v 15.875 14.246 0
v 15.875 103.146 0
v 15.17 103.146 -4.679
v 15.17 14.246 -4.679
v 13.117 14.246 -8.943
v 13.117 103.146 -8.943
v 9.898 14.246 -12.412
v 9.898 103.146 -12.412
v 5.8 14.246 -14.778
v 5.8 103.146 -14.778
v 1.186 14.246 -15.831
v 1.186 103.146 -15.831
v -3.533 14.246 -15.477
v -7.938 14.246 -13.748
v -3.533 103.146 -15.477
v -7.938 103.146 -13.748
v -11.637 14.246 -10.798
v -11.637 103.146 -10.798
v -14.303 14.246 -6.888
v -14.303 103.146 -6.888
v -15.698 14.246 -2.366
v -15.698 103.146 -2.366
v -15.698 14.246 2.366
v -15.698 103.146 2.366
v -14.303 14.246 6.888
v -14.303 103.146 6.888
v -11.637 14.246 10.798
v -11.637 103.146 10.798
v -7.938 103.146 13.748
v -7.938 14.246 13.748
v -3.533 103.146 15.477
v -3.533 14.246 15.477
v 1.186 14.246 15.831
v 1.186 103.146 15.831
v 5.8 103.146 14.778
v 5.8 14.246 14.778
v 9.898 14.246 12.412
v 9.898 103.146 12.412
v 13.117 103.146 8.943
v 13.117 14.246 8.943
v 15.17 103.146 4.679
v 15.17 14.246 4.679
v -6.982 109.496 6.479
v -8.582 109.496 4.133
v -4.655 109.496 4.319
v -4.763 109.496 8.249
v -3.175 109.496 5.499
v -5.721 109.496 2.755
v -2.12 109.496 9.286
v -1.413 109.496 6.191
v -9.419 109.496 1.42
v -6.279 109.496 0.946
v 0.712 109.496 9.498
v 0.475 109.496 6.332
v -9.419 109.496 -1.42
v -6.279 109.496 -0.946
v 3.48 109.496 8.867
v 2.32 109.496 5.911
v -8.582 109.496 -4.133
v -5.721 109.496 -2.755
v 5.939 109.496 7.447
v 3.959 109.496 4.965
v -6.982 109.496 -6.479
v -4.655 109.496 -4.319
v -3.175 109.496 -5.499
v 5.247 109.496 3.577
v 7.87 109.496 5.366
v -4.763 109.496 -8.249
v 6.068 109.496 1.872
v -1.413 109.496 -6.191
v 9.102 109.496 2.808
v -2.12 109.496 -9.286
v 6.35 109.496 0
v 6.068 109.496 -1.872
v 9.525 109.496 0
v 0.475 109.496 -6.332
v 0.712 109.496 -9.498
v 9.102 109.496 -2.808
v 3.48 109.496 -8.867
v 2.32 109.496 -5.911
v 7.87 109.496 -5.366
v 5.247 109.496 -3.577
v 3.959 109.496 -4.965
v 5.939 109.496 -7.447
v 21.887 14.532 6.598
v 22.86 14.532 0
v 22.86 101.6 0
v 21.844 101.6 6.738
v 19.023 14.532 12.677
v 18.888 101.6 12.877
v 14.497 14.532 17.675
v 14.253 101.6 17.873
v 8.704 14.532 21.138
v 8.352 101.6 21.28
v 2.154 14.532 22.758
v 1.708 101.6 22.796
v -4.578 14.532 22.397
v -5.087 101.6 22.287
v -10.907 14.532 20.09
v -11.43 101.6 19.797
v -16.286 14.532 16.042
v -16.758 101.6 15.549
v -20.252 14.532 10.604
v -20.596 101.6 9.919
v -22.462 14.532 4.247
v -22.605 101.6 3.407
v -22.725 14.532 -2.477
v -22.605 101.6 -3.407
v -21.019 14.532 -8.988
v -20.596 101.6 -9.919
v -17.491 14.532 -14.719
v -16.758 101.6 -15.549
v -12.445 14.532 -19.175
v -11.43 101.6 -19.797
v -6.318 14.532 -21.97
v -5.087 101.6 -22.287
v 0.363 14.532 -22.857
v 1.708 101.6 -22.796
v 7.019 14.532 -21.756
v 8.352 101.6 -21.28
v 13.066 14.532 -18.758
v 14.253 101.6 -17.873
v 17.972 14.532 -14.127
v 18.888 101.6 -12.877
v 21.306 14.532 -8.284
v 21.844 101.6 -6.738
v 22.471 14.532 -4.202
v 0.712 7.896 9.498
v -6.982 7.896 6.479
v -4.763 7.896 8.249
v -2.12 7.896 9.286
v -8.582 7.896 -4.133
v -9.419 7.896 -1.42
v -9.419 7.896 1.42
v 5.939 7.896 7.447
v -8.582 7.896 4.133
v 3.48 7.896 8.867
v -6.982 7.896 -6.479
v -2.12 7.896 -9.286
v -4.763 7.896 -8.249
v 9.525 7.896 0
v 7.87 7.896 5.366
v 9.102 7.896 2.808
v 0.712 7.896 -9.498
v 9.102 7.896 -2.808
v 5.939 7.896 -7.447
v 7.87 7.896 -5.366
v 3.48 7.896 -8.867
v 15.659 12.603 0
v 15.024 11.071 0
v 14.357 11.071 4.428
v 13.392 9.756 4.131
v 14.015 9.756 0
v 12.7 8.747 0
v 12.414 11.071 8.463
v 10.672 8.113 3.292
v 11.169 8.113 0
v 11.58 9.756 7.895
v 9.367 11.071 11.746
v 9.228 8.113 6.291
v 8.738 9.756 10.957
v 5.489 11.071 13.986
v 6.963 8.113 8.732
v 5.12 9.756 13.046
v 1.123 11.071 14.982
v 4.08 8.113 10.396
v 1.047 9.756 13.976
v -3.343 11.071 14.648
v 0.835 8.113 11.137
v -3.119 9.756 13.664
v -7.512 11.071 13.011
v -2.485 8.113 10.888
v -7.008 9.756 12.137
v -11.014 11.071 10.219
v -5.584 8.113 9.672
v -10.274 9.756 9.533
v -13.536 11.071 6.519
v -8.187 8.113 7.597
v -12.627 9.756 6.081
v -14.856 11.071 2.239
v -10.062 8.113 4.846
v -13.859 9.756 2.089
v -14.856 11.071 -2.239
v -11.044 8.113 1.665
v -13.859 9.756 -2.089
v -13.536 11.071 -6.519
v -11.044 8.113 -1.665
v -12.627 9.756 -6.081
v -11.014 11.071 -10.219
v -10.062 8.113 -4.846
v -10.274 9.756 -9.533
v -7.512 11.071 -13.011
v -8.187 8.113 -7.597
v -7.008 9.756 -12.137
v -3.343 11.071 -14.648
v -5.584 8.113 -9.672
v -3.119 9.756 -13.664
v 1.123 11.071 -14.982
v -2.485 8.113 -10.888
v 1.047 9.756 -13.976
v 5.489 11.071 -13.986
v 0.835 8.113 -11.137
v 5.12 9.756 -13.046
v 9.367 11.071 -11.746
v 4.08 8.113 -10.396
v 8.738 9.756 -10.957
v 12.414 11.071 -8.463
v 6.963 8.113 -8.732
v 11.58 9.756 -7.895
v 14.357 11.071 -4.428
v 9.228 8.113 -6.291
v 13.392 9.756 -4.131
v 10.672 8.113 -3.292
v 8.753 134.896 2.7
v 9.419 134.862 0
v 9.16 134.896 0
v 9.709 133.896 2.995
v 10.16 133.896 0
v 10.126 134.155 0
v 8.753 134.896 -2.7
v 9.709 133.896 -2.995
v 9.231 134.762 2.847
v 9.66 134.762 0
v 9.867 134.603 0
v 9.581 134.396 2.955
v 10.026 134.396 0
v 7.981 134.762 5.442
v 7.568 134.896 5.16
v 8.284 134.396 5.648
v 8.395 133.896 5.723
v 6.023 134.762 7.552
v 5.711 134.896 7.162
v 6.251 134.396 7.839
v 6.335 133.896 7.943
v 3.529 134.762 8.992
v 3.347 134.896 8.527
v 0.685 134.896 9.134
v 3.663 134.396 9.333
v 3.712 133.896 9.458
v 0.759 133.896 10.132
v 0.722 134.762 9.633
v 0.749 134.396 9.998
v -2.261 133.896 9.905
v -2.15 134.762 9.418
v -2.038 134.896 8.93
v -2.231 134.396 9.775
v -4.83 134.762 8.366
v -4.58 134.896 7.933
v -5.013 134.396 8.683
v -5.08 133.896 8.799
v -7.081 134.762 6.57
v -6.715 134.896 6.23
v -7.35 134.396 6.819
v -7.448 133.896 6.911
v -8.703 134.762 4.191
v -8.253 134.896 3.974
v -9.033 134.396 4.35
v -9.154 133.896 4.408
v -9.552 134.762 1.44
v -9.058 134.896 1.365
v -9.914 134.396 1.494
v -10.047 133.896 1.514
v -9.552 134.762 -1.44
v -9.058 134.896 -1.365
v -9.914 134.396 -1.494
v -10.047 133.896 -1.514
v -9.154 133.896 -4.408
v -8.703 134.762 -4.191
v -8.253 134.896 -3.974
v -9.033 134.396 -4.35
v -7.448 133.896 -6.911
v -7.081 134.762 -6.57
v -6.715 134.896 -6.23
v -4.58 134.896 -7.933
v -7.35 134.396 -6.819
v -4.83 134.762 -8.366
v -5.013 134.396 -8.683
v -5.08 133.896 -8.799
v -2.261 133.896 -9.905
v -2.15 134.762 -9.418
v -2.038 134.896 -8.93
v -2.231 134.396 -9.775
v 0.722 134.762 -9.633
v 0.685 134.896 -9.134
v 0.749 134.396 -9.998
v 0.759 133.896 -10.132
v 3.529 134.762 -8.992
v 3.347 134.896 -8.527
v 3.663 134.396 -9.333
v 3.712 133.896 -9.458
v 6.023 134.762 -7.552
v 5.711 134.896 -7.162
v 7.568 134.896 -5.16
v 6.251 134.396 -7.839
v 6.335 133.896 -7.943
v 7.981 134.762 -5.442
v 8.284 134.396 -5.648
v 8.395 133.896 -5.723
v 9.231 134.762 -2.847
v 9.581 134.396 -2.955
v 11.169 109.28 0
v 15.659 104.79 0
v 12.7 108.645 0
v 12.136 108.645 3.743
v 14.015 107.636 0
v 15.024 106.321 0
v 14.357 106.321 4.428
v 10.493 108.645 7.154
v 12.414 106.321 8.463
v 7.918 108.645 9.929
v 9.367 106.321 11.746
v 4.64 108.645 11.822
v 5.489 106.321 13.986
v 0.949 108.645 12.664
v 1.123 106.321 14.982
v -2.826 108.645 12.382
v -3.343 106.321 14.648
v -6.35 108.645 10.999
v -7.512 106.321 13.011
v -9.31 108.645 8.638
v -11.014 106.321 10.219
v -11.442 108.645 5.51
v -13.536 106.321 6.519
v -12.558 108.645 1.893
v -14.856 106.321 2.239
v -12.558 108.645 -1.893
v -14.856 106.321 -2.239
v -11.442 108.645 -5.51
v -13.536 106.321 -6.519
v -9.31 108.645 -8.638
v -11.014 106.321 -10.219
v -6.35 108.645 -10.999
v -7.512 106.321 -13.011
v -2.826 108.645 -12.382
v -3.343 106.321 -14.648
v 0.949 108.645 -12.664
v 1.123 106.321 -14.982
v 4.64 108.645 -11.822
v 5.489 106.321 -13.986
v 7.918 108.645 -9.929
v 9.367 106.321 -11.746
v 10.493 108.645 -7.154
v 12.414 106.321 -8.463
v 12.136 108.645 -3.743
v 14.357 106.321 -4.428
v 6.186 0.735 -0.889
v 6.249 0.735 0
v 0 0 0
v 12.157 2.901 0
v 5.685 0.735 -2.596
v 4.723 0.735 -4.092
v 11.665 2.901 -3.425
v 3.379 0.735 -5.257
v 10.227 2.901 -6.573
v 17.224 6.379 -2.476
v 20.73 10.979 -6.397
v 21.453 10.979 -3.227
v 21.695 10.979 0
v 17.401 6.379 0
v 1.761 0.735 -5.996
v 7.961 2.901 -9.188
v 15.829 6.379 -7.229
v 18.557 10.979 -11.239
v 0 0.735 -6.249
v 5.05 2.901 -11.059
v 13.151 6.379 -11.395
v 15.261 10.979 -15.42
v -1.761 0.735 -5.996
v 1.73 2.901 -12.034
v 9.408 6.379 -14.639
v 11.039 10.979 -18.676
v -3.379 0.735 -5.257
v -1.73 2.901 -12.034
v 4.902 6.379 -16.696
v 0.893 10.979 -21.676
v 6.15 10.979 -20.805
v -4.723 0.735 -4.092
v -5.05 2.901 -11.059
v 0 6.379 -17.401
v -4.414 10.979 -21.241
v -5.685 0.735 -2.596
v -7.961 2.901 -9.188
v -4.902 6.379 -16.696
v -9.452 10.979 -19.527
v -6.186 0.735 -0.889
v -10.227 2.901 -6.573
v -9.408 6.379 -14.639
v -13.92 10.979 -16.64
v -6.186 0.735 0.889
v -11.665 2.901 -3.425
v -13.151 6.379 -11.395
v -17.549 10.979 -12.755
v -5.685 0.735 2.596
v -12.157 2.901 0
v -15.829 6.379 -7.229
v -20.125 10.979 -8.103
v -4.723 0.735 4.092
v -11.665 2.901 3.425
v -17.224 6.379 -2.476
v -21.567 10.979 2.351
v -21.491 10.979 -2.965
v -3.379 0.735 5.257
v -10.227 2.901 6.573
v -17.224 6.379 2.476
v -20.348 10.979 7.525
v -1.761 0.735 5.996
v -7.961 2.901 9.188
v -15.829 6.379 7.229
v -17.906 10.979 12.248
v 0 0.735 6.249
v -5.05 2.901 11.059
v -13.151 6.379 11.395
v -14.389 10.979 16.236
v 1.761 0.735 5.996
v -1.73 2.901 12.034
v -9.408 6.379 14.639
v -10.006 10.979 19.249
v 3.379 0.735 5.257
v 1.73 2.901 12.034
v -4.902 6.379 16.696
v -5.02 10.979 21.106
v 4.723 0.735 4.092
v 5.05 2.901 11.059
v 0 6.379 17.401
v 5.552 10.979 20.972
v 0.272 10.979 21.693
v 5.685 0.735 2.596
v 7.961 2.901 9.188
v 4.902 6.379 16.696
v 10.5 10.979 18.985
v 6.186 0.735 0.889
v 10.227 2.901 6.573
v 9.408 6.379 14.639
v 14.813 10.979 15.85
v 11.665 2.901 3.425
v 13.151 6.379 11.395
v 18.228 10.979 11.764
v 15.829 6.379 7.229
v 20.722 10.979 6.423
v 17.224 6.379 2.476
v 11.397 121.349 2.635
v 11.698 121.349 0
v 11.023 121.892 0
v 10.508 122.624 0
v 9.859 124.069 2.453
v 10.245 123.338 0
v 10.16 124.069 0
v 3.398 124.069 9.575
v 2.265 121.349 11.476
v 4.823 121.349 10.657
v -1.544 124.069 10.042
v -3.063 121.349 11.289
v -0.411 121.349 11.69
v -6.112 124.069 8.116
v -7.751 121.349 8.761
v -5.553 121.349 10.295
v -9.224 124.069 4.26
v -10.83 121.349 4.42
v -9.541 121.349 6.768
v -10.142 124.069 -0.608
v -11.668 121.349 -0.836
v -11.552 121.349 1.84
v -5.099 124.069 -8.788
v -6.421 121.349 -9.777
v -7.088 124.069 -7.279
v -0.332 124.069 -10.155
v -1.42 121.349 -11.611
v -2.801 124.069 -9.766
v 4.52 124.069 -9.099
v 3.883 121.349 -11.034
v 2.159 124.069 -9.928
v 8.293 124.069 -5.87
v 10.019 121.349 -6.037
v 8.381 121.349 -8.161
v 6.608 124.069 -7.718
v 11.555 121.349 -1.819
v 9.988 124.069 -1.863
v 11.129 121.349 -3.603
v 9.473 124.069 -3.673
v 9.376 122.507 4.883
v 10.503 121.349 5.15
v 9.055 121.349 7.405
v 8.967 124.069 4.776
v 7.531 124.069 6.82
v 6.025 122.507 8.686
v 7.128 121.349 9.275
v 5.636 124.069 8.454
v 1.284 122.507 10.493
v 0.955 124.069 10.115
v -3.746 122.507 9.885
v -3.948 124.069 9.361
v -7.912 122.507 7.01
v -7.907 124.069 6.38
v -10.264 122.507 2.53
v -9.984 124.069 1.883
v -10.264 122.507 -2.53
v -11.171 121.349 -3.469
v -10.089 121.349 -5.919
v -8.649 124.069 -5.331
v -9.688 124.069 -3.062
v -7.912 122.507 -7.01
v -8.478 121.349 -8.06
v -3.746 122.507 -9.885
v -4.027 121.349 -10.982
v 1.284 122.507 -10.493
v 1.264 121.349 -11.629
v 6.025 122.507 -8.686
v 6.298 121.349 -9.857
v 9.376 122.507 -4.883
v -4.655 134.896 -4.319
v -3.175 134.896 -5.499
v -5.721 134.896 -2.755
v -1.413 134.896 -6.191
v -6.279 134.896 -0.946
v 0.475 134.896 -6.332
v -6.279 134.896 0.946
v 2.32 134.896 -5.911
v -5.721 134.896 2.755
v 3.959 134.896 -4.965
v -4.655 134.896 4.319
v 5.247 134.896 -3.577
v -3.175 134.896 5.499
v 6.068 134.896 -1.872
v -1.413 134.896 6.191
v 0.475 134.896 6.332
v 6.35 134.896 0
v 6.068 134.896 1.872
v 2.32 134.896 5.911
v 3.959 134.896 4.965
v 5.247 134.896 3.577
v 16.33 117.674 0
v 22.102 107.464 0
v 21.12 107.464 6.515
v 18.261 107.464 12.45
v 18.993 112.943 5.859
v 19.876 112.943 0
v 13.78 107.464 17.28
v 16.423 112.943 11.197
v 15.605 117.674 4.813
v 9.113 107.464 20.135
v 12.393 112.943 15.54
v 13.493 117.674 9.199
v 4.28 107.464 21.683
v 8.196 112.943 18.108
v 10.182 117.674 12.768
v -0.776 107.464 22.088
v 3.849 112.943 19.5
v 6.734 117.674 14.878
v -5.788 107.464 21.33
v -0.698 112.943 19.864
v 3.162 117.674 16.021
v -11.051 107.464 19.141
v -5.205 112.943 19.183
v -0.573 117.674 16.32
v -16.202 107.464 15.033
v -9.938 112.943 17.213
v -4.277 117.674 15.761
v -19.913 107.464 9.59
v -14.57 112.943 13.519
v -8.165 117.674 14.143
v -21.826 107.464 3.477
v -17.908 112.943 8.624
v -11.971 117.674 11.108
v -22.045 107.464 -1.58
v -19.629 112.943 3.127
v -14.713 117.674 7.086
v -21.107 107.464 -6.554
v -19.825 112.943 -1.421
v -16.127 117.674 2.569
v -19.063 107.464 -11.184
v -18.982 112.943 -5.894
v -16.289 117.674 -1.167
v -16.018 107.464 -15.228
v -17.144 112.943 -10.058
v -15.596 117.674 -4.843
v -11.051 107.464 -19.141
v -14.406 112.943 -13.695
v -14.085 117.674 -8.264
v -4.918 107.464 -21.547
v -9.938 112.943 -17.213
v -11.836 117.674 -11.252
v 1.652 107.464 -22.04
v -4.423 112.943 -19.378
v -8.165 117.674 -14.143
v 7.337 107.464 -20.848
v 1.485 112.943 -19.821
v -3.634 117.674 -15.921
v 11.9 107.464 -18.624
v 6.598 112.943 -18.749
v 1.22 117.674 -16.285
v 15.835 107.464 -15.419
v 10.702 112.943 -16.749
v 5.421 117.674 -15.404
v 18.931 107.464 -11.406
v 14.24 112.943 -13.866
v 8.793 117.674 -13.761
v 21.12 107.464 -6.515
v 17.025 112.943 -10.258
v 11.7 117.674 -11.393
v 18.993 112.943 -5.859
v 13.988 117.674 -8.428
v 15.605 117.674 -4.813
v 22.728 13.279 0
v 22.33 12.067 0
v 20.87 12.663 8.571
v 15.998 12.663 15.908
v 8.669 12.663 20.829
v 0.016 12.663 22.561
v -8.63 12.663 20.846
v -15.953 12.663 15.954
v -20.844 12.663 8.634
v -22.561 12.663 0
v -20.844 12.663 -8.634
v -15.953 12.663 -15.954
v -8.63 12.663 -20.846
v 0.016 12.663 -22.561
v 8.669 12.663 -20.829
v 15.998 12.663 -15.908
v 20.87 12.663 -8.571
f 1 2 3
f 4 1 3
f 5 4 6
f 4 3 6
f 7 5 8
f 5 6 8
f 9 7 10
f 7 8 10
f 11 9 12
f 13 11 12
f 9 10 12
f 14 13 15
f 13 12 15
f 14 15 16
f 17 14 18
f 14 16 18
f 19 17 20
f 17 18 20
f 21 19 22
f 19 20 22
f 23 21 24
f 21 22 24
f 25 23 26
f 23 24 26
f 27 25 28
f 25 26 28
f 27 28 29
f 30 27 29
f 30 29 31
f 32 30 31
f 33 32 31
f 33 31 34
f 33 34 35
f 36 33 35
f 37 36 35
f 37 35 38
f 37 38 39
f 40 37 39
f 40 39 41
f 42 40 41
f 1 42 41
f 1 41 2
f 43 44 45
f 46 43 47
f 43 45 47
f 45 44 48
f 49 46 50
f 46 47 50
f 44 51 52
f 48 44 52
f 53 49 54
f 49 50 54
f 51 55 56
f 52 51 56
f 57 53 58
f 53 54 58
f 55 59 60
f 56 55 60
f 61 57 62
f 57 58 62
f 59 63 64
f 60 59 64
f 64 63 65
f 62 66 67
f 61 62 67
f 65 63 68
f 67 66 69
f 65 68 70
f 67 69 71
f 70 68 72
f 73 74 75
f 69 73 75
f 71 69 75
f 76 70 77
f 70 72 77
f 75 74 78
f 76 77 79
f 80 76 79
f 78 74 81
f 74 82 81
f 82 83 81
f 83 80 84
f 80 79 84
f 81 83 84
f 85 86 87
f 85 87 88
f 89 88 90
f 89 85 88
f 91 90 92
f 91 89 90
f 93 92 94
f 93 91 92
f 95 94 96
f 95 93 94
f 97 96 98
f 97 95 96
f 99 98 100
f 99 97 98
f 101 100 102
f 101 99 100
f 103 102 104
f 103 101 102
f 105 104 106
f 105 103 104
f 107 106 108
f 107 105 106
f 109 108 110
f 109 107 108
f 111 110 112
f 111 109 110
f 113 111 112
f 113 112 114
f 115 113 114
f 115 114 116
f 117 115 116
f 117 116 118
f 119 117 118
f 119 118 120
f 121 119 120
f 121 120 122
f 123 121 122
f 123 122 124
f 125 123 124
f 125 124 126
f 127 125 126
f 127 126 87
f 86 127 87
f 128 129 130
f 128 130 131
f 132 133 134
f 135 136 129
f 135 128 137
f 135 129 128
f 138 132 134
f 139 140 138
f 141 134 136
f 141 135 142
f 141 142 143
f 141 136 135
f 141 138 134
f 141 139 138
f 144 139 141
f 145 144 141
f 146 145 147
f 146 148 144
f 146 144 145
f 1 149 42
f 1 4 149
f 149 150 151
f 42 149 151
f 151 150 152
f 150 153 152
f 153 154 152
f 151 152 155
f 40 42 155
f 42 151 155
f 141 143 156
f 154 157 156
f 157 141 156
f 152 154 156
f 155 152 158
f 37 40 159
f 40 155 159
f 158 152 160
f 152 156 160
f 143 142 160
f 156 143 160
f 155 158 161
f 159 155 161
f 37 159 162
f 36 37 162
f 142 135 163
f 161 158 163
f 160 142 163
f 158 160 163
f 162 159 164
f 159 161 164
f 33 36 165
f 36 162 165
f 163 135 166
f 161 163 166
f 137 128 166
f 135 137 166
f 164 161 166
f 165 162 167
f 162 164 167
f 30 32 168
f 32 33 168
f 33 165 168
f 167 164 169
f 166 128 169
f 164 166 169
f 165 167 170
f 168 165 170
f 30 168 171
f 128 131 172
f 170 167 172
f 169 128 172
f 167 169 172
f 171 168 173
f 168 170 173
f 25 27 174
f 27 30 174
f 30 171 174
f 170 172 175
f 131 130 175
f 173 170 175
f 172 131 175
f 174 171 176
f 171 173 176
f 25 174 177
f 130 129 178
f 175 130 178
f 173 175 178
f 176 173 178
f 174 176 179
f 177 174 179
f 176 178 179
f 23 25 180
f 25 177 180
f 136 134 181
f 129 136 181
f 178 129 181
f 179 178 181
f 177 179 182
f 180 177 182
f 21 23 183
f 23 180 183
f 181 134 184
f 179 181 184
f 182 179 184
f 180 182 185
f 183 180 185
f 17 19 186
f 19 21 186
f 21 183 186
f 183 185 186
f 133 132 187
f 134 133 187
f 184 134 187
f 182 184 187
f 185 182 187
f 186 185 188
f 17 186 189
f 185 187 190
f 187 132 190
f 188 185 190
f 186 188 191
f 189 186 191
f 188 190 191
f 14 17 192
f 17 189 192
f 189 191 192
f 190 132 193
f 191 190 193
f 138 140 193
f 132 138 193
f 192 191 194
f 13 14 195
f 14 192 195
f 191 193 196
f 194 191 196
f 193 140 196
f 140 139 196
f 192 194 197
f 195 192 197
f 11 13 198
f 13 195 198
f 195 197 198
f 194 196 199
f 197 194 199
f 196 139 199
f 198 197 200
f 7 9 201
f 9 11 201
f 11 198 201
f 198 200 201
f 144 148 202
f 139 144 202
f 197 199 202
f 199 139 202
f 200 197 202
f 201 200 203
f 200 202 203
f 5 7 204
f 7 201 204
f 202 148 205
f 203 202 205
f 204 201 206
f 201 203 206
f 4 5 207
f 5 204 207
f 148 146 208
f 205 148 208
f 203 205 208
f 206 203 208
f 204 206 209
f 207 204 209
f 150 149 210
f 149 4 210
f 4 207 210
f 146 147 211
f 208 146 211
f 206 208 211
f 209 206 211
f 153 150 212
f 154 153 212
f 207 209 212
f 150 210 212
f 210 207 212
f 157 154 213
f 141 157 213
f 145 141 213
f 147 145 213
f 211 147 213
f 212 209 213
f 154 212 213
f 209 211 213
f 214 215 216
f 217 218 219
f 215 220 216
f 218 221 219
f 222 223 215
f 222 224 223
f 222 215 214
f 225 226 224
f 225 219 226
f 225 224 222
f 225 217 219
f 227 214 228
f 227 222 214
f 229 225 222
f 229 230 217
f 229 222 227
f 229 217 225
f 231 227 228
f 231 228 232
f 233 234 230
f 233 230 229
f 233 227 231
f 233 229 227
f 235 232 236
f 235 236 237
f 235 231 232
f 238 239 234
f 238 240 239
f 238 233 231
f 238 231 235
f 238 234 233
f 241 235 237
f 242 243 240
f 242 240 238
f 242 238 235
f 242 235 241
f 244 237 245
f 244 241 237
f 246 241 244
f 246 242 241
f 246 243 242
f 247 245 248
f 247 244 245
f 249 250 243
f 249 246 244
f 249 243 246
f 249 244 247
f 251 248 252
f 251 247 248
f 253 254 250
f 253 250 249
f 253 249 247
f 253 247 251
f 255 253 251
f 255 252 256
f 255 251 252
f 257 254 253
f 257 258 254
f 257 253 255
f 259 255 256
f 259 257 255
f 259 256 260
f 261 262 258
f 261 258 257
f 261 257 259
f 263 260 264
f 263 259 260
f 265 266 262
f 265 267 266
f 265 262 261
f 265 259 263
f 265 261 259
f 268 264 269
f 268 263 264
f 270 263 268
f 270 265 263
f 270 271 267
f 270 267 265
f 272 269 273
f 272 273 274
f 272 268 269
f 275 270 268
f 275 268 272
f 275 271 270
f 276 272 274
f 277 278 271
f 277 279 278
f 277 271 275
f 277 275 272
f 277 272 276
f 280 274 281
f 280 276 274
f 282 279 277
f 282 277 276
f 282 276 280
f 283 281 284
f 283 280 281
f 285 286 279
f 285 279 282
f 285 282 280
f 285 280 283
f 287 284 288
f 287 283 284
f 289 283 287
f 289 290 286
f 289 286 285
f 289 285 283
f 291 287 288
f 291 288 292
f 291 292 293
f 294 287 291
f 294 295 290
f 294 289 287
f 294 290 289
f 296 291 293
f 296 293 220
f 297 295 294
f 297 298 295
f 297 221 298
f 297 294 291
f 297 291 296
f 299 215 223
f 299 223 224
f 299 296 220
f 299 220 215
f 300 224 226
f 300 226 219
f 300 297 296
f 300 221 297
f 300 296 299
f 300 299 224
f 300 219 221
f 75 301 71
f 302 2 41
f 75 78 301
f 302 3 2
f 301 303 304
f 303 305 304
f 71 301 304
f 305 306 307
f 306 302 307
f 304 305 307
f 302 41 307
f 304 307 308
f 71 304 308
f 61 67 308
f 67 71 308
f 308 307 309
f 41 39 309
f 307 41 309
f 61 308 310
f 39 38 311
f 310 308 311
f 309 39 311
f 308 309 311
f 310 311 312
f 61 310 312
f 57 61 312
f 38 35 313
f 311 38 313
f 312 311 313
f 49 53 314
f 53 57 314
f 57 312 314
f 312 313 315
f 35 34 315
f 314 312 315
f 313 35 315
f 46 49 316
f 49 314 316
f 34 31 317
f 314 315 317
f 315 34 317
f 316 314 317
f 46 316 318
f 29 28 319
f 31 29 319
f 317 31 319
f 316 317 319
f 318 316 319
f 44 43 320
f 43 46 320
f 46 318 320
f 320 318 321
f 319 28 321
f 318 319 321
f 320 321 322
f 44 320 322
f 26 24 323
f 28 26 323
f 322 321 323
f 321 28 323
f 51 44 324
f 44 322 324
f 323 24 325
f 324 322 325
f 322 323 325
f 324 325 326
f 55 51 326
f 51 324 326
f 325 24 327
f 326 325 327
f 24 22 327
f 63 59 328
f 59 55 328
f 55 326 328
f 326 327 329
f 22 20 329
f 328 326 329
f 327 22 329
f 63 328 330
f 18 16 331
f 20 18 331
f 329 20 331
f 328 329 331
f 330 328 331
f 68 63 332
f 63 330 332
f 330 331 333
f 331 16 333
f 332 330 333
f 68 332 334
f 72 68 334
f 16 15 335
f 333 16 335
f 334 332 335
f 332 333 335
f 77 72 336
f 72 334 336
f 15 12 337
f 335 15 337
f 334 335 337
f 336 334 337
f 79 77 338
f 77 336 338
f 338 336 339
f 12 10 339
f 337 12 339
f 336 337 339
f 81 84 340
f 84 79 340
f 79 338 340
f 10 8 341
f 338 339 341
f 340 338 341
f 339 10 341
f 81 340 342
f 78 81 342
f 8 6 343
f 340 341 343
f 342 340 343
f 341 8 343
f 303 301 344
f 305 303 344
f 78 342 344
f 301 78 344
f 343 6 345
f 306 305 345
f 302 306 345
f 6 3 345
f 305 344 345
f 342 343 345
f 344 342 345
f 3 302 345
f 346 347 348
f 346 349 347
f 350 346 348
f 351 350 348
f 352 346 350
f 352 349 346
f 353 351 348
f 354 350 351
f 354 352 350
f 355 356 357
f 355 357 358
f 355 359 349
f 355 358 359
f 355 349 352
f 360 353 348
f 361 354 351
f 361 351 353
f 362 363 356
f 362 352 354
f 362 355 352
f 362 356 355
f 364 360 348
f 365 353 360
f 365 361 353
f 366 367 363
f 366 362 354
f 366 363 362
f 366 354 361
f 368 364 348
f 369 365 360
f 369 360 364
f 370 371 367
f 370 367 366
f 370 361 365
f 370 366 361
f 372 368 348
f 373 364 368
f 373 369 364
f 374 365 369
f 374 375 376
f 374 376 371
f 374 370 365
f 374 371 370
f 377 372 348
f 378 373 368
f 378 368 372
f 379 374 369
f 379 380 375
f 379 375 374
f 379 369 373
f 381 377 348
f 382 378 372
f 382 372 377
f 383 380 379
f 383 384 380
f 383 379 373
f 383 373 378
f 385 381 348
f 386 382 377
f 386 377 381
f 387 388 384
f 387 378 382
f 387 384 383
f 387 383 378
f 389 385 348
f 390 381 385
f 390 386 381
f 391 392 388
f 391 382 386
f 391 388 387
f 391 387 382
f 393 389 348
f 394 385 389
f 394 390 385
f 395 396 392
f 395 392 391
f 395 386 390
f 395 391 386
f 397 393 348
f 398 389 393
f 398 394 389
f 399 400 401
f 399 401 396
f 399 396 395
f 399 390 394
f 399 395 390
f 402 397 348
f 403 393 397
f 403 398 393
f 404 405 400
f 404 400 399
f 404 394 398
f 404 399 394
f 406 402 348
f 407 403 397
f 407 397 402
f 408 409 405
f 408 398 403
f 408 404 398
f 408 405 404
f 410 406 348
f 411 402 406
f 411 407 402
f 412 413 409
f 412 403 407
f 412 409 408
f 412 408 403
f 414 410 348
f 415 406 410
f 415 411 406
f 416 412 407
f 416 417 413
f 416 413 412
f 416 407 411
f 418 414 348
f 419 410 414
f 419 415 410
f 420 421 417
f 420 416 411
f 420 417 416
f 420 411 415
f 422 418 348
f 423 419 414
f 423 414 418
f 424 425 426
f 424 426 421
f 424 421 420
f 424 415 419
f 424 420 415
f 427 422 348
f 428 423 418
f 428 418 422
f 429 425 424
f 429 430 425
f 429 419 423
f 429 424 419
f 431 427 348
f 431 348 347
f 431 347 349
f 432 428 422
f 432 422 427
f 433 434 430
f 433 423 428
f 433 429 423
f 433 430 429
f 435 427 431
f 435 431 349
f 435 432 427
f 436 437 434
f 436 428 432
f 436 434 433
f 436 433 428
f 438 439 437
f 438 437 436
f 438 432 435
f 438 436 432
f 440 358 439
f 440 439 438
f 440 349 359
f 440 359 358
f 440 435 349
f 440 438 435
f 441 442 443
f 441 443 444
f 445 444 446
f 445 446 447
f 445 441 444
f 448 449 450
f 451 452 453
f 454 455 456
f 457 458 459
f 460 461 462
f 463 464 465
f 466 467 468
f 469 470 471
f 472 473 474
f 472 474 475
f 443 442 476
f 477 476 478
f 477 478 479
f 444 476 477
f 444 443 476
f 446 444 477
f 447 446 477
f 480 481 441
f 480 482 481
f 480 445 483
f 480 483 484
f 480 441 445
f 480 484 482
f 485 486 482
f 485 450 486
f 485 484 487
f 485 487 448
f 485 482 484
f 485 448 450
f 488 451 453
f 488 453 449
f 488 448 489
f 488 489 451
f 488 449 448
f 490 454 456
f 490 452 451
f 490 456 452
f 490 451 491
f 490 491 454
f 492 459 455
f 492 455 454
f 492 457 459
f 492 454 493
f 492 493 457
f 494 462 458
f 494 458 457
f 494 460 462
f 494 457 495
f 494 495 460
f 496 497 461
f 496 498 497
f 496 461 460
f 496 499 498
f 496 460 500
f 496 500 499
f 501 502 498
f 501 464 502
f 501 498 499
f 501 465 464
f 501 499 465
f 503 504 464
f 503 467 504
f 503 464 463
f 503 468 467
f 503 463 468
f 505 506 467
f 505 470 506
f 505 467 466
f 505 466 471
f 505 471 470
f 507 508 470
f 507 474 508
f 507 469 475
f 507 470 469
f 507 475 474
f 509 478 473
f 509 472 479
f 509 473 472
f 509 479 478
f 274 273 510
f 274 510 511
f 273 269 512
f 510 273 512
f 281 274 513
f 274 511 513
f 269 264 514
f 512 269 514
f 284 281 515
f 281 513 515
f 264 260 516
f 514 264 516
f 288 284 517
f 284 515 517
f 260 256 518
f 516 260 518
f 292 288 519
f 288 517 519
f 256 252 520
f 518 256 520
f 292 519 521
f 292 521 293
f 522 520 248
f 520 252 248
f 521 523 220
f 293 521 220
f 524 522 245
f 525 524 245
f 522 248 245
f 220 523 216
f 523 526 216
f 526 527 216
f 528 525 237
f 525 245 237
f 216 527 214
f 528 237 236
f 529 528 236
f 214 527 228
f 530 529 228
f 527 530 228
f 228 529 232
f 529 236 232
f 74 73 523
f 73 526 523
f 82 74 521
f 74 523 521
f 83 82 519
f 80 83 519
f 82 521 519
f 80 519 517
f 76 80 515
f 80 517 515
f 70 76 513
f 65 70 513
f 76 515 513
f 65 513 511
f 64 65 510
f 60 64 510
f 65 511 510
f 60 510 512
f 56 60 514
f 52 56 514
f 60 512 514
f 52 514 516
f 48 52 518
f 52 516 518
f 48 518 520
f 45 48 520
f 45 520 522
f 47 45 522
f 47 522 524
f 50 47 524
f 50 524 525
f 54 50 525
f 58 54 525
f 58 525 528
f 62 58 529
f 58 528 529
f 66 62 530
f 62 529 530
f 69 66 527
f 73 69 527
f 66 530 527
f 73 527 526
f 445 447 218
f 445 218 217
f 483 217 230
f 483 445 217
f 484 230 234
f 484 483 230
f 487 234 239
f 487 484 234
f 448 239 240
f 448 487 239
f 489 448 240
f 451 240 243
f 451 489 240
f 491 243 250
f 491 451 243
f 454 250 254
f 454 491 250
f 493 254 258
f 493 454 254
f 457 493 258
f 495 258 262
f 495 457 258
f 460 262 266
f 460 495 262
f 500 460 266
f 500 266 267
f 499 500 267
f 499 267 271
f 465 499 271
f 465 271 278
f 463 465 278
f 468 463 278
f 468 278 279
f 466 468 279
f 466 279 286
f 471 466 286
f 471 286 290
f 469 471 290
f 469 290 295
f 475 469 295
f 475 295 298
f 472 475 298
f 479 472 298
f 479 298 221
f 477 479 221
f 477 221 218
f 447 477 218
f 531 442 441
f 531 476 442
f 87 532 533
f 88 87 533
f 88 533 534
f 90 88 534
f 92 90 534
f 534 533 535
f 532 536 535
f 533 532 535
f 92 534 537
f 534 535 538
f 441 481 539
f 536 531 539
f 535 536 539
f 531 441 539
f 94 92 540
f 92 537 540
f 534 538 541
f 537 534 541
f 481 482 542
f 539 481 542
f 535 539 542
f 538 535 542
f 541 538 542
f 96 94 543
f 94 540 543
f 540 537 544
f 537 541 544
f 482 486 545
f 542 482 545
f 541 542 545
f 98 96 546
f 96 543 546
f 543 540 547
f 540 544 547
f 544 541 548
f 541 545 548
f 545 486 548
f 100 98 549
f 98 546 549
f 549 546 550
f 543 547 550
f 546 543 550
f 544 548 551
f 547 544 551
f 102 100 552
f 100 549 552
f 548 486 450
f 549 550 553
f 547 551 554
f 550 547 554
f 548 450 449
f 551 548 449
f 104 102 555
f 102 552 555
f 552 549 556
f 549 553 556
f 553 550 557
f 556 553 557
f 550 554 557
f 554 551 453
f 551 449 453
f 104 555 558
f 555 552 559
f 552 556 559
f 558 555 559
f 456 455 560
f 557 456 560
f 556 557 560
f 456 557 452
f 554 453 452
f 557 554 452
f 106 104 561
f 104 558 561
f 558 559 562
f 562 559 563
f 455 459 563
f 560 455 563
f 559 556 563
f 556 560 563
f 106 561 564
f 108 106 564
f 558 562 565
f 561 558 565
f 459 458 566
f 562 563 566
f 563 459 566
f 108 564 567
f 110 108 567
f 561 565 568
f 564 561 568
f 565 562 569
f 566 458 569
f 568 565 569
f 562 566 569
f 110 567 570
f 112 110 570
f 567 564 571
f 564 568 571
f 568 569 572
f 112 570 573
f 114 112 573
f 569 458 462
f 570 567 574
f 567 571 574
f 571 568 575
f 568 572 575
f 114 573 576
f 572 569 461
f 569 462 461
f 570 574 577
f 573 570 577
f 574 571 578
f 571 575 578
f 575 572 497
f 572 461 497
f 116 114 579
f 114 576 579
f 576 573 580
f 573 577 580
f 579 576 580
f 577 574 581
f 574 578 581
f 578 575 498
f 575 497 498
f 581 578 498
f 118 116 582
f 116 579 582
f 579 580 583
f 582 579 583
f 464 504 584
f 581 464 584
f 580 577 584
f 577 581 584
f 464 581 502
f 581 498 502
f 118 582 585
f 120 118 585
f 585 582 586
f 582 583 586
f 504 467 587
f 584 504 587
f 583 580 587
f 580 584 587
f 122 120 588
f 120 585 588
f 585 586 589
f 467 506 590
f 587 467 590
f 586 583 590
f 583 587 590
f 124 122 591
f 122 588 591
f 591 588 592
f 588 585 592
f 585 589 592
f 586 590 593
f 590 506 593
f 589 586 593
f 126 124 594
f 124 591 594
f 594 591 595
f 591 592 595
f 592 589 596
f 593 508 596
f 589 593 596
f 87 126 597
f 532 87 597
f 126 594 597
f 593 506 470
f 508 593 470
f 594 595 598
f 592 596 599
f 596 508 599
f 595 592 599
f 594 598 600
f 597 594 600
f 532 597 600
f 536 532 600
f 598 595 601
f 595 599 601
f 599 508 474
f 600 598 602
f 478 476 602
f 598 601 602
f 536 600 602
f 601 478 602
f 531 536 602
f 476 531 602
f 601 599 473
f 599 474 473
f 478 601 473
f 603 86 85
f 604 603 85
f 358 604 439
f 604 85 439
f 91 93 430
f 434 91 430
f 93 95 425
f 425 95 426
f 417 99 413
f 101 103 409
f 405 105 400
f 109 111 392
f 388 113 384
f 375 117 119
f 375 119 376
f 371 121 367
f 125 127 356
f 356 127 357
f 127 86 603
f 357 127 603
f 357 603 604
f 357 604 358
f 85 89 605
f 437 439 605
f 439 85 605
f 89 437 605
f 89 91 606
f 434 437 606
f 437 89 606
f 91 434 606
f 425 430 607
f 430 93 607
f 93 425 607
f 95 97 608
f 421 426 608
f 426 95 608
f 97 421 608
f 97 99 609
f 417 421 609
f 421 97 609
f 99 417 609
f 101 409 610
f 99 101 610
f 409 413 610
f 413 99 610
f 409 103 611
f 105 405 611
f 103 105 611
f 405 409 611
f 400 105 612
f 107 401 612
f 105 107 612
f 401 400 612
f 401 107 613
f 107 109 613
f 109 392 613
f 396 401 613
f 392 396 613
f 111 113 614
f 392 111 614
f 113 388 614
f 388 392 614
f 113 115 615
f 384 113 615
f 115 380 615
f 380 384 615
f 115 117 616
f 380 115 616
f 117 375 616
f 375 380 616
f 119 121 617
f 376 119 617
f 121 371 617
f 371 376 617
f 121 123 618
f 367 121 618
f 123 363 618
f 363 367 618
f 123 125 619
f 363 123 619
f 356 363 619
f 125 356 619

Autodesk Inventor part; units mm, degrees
ref_plane "YZ Plane" through (0, 0, 0) normal (1, 0, 0) x (0, 1, 0)
ref_plane "XZ Plane" through (0, 0, 0) normal (0, 1, 0) x (-1, 0, 0)
ref_plane "XY Plane" through (0, 0, 0) normal (0, 0, 1) x (1, 0, 0)
sketch "Sketch1" plane through (0, 0, 0) normal (0, 0, 1) x (1, 0, 0)
  line L0 (22.86, 101.6) -> (22.86, 12.7)
  line L1 (22.86, 101.6) -> (0, 101.6) construction
  line L2 (0, 101.6) -> (0, 12.7)
  line L3 (0, 12.7) -> (22.86, 12.7)
  line L4 (0, 101.6) -> (0, 122.1962)
  line L5 (0, 122.1962) -> (10.16, 122.1962) construction
  line L6 (10.16, 122.1962) -> (0, 122.1962)
  line L7 (0, 122.1962) -> (0, 134.8962)
  line L8 (0, 134.8962) -> (10.16, 134.8962)
  line L9 (10.16, 134.8962) -> (10.16, 122.1962)
  line L10 (0, 12.7) -> (0, 0)
  arc A0 (0, 0) -> (22.86, 12.7) centre (0, 26.924) ccw
  line L11 (0, 0) -> (22.86, 0) construction
  line L12 (22.86, 0) -> (22.86, 12.7) construction
  arc A1 (22.86, 101.6) -> (10.16, 122.1962) centre (-0.1909, 101.6) ccw
  point P0 (0, 122.1962)
  dimension "d0" = 88.9
  dimension "d1" = 22.86
  dimension "d3" = 10.16
  dimension "d4" = 12.7
  dimension "d5" = 12.7
revolve "Revolution1" add sketch "Sketch1" angle 360 about axis through (0, 101.6, 0) along (0, -1, 0)
fillet "Fillet1" radius 6 1 edges at (-22.86, 12.7, 0)
fillet "Fillet2" radius 3.175 1 edges at (-10.16, 122.1962, 0)
sketch "Sketch2" plane through (0, 134.8962, 0) normal (0, 1, 0) x (1, 0, 0)
  circle A0 centre (0, 0) radius 10.16 projected
  circle A1 centre (0, 0) radius 6.35
  point P0 (0, 0)
  dimension "d9" = 12.7
extrude "Extrusion1" cut sketch "Sketch2" against normal blind 25.4 contours A1
sketch "Sketch3" plane through (0, 109.4962, 0) normal (0, 1, 0) x (1, 0, 0)
  circle A0 centre (0, 0) radius 15.875
  dimension "d12" = 31.75
extrude "Extrusion2" cut sketch "Sketch3" against normal blind 101.6
fillet "Fillet3" radius 6.35 2 edges at (-15.875, 109.4962, 0) (-15.875, 7.8962, 0)
fillet "Fillet4" radius 1 1 edges at (-10.16, 134.8962, 0)
properties part number "CO2Cartridge16g"
